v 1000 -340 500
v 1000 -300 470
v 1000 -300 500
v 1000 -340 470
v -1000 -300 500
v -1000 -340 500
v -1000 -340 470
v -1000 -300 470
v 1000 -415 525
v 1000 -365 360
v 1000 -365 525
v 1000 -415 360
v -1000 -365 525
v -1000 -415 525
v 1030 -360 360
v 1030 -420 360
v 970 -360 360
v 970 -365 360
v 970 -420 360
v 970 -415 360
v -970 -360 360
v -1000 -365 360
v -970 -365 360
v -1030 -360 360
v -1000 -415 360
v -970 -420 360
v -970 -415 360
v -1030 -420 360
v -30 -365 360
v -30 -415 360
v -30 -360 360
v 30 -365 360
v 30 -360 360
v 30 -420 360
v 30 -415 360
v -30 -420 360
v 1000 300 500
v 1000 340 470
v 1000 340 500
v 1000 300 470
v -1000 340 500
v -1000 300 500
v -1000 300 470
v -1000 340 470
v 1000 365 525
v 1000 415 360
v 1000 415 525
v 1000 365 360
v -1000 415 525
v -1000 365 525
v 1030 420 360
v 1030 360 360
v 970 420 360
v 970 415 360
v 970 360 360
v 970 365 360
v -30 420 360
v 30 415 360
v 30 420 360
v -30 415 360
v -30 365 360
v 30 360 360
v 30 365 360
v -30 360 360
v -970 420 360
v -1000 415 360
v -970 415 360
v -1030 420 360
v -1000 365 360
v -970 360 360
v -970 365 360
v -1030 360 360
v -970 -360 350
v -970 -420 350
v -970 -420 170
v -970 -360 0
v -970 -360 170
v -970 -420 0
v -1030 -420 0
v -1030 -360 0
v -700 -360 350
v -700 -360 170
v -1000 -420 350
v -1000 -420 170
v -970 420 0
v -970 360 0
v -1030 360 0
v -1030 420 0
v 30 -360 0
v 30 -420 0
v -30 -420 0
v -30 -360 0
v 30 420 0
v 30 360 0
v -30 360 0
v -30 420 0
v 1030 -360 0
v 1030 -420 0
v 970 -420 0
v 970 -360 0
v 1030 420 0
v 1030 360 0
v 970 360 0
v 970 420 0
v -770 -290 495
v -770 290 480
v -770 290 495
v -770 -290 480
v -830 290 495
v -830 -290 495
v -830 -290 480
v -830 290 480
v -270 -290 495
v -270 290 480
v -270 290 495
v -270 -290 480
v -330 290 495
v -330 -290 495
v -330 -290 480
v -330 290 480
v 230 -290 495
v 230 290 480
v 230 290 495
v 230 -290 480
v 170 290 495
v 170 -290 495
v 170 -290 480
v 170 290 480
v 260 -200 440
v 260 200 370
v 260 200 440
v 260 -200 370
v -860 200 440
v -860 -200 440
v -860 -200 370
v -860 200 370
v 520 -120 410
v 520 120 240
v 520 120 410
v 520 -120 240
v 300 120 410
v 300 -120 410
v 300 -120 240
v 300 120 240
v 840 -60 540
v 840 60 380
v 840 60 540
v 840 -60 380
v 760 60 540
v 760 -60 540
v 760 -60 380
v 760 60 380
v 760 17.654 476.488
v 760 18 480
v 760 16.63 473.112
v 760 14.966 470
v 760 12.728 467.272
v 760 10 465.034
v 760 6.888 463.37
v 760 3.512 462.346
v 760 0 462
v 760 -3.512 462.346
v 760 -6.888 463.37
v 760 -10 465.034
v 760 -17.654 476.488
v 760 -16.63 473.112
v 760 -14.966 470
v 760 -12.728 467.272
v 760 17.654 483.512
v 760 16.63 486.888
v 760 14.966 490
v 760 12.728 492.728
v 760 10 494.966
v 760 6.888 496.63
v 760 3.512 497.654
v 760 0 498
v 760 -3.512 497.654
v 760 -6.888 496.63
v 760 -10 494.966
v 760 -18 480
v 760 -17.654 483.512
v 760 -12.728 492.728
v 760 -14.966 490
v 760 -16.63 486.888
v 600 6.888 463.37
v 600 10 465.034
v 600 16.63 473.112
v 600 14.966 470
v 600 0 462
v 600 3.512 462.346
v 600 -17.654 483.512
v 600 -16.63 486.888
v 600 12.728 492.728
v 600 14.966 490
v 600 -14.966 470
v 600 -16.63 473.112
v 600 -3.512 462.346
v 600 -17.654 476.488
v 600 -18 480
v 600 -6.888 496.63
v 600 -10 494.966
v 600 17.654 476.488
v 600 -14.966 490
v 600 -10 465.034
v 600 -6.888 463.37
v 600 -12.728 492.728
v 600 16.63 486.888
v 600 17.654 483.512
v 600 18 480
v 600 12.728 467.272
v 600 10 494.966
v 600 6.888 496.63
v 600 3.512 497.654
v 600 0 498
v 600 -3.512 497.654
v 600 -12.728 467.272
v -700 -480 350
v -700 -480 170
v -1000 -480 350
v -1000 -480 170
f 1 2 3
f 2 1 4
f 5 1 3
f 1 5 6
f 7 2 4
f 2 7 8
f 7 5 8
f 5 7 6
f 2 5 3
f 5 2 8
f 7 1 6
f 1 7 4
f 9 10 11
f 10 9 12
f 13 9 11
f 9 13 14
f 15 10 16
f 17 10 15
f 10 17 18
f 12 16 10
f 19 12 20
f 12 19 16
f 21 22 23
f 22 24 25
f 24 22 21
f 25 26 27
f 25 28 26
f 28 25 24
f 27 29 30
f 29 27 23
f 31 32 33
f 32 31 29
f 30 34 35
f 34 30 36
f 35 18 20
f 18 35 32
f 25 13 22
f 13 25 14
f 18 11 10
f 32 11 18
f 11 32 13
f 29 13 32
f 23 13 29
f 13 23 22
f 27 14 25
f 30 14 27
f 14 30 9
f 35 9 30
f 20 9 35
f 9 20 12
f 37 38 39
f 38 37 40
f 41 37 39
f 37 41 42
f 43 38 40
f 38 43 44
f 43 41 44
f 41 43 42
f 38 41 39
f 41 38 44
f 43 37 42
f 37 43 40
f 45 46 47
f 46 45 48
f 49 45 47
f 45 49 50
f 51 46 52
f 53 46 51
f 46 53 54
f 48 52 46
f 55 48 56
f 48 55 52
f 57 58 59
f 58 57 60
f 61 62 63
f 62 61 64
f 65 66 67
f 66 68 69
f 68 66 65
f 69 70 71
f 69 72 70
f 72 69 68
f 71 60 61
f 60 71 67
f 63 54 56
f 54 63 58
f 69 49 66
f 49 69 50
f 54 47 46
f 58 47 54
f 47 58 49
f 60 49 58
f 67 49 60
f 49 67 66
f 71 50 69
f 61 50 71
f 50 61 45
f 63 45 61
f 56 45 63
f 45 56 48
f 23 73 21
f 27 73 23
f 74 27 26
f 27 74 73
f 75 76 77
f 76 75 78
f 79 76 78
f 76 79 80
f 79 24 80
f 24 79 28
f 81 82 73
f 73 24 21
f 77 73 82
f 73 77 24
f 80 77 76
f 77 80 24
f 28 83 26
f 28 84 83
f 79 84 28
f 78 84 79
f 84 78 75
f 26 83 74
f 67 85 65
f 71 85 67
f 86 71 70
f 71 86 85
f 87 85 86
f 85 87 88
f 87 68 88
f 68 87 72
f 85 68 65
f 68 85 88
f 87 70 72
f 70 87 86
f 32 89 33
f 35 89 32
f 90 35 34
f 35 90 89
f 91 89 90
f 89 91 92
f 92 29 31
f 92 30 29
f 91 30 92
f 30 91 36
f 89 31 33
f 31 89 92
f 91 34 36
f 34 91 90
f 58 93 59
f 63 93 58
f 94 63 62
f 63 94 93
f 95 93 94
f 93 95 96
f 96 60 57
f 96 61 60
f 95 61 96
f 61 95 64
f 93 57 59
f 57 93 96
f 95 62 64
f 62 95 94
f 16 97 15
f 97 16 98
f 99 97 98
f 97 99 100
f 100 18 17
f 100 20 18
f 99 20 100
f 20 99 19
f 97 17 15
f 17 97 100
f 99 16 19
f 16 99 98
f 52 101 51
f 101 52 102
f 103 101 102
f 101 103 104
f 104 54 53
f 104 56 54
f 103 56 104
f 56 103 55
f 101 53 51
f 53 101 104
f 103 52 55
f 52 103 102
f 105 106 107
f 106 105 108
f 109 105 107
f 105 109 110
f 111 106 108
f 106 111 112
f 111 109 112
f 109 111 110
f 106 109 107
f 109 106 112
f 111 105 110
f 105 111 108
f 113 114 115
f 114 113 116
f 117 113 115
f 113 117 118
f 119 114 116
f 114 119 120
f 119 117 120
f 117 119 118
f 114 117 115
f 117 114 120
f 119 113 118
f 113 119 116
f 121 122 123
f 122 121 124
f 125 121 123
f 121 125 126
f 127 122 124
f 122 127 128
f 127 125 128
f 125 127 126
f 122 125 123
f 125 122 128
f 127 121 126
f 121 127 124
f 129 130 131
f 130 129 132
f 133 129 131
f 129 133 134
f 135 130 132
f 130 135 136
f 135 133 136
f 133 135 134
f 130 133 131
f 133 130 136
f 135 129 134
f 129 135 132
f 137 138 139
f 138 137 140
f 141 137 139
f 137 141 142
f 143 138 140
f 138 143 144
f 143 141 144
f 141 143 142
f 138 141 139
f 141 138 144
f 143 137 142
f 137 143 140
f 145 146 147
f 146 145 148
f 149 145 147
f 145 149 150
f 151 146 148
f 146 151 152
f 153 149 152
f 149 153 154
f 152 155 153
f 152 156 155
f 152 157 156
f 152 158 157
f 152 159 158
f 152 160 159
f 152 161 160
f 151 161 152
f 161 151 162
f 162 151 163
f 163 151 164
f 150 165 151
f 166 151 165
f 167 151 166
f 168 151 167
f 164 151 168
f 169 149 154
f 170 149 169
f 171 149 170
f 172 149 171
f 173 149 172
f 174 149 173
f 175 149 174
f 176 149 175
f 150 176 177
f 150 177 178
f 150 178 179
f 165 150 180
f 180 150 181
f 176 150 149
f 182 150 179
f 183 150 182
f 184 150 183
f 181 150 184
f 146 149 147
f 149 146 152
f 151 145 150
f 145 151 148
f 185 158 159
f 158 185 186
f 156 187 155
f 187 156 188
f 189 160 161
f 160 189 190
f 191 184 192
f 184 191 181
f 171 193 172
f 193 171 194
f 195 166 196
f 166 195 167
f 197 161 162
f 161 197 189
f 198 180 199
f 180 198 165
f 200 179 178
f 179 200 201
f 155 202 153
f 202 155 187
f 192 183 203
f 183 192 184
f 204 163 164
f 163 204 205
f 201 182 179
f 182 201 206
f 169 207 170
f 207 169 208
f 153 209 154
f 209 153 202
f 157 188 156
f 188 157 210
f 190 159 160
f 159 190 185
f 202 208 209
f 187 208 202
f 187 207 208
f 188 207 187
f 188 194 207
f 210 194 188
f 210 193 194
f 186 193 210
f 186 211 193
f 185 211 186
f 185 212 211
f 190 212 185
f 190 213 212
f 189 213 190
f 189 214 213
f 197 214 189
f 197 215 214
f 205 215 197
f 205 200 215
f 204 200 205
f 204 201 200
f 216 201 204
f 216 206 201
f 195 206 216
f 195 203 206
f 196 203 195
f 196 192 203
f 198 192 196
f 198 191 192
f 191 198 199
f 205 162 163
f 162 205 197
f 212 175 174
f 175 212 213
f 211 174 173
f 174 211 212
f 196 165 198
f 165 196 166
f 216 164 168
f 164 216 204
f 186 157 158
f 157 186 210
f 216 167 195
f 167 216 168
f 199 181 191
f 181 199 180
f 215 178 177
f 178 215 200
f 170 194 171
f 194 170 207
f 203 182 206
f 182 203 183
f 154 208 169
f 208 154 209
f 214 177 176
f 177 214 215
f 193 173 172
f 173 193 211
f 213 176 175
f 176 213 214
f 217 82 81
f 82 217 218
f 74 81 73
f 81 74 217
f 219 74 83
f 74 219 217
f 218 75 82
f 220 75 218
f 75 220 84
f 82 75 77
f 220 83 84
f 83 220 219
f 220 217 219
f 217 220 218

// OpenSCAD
// main_line_module - generated by asm_3d.py from out/assembly/assembly_specs.json (F4.4) - units mm
// DESIGN - check and release before manufacture. z up, conveyor top z = 500.

module main_line_module() {
  translate([-1000.00, -340.00, 470.00]) cube([2000.00, 40.00, 30.00]);
  translate([-1000.00, -415.00, 360.00]) cube([2000.00, 50.00, 165.00]);
  translate([-1000.00, 300.00, 470.00]) cube([2000.00, 40.00, 30.00]);
  translate([-1000.00, 365.00, 360.00]) cube([2000.00, 50.00, 165.00]);
  translate([-1030.00, -420.00, 0.00]) cube([60.00, 60.00, 360.00]);
  translate([-1030.00, 360.00, 0.00]) cube([60.00, 60.00, 360.00]);
  translate([-30.00, -420.00, 0.00]) cube([60.00, 60.00, 360.00]);
  translate([-30.00, 360.00, 0.00]) cube([60.00, 60.00, 360.00]);
  translate([970.00, -420.00, 0.00]) cube([60.00, 60.00, 360.00]);
  translate([970.00, 360.00, 0.00]) cube([60.00, 60.00, 360.00]);
  translate([-830.00, -290.00, 480.00]) cube([60.00, 580.00, 15.00]);
  translate([-330.00, -290.00, 480.00]) cube([60.00, 580.00, 15.00]);
  translate([170.00, -290.00, 480.00]) cube([60.00, 580.00, 15.00]);
  translate([-860.00, -200.00, 370.00]) cube([1120.00, 400.00, 70.00]);
  translate([300.00, -120.00, 240.00]) cube([220.00, 240.00, 170.00]);
  translate([760.00, -60.00, 380.00]) cube([80.00, 120.00, 160.00]);
  translate([680.00, 0.00, 480.00]) rotate([0, 90, 0]) cylinder(r = 18.00, h = 160.00, center = true, $fn = 32);
  translate([-1000.00, -480.00, 170.00]) cube([300.00, 120.00, 180.00]);
}
main_line_module();
